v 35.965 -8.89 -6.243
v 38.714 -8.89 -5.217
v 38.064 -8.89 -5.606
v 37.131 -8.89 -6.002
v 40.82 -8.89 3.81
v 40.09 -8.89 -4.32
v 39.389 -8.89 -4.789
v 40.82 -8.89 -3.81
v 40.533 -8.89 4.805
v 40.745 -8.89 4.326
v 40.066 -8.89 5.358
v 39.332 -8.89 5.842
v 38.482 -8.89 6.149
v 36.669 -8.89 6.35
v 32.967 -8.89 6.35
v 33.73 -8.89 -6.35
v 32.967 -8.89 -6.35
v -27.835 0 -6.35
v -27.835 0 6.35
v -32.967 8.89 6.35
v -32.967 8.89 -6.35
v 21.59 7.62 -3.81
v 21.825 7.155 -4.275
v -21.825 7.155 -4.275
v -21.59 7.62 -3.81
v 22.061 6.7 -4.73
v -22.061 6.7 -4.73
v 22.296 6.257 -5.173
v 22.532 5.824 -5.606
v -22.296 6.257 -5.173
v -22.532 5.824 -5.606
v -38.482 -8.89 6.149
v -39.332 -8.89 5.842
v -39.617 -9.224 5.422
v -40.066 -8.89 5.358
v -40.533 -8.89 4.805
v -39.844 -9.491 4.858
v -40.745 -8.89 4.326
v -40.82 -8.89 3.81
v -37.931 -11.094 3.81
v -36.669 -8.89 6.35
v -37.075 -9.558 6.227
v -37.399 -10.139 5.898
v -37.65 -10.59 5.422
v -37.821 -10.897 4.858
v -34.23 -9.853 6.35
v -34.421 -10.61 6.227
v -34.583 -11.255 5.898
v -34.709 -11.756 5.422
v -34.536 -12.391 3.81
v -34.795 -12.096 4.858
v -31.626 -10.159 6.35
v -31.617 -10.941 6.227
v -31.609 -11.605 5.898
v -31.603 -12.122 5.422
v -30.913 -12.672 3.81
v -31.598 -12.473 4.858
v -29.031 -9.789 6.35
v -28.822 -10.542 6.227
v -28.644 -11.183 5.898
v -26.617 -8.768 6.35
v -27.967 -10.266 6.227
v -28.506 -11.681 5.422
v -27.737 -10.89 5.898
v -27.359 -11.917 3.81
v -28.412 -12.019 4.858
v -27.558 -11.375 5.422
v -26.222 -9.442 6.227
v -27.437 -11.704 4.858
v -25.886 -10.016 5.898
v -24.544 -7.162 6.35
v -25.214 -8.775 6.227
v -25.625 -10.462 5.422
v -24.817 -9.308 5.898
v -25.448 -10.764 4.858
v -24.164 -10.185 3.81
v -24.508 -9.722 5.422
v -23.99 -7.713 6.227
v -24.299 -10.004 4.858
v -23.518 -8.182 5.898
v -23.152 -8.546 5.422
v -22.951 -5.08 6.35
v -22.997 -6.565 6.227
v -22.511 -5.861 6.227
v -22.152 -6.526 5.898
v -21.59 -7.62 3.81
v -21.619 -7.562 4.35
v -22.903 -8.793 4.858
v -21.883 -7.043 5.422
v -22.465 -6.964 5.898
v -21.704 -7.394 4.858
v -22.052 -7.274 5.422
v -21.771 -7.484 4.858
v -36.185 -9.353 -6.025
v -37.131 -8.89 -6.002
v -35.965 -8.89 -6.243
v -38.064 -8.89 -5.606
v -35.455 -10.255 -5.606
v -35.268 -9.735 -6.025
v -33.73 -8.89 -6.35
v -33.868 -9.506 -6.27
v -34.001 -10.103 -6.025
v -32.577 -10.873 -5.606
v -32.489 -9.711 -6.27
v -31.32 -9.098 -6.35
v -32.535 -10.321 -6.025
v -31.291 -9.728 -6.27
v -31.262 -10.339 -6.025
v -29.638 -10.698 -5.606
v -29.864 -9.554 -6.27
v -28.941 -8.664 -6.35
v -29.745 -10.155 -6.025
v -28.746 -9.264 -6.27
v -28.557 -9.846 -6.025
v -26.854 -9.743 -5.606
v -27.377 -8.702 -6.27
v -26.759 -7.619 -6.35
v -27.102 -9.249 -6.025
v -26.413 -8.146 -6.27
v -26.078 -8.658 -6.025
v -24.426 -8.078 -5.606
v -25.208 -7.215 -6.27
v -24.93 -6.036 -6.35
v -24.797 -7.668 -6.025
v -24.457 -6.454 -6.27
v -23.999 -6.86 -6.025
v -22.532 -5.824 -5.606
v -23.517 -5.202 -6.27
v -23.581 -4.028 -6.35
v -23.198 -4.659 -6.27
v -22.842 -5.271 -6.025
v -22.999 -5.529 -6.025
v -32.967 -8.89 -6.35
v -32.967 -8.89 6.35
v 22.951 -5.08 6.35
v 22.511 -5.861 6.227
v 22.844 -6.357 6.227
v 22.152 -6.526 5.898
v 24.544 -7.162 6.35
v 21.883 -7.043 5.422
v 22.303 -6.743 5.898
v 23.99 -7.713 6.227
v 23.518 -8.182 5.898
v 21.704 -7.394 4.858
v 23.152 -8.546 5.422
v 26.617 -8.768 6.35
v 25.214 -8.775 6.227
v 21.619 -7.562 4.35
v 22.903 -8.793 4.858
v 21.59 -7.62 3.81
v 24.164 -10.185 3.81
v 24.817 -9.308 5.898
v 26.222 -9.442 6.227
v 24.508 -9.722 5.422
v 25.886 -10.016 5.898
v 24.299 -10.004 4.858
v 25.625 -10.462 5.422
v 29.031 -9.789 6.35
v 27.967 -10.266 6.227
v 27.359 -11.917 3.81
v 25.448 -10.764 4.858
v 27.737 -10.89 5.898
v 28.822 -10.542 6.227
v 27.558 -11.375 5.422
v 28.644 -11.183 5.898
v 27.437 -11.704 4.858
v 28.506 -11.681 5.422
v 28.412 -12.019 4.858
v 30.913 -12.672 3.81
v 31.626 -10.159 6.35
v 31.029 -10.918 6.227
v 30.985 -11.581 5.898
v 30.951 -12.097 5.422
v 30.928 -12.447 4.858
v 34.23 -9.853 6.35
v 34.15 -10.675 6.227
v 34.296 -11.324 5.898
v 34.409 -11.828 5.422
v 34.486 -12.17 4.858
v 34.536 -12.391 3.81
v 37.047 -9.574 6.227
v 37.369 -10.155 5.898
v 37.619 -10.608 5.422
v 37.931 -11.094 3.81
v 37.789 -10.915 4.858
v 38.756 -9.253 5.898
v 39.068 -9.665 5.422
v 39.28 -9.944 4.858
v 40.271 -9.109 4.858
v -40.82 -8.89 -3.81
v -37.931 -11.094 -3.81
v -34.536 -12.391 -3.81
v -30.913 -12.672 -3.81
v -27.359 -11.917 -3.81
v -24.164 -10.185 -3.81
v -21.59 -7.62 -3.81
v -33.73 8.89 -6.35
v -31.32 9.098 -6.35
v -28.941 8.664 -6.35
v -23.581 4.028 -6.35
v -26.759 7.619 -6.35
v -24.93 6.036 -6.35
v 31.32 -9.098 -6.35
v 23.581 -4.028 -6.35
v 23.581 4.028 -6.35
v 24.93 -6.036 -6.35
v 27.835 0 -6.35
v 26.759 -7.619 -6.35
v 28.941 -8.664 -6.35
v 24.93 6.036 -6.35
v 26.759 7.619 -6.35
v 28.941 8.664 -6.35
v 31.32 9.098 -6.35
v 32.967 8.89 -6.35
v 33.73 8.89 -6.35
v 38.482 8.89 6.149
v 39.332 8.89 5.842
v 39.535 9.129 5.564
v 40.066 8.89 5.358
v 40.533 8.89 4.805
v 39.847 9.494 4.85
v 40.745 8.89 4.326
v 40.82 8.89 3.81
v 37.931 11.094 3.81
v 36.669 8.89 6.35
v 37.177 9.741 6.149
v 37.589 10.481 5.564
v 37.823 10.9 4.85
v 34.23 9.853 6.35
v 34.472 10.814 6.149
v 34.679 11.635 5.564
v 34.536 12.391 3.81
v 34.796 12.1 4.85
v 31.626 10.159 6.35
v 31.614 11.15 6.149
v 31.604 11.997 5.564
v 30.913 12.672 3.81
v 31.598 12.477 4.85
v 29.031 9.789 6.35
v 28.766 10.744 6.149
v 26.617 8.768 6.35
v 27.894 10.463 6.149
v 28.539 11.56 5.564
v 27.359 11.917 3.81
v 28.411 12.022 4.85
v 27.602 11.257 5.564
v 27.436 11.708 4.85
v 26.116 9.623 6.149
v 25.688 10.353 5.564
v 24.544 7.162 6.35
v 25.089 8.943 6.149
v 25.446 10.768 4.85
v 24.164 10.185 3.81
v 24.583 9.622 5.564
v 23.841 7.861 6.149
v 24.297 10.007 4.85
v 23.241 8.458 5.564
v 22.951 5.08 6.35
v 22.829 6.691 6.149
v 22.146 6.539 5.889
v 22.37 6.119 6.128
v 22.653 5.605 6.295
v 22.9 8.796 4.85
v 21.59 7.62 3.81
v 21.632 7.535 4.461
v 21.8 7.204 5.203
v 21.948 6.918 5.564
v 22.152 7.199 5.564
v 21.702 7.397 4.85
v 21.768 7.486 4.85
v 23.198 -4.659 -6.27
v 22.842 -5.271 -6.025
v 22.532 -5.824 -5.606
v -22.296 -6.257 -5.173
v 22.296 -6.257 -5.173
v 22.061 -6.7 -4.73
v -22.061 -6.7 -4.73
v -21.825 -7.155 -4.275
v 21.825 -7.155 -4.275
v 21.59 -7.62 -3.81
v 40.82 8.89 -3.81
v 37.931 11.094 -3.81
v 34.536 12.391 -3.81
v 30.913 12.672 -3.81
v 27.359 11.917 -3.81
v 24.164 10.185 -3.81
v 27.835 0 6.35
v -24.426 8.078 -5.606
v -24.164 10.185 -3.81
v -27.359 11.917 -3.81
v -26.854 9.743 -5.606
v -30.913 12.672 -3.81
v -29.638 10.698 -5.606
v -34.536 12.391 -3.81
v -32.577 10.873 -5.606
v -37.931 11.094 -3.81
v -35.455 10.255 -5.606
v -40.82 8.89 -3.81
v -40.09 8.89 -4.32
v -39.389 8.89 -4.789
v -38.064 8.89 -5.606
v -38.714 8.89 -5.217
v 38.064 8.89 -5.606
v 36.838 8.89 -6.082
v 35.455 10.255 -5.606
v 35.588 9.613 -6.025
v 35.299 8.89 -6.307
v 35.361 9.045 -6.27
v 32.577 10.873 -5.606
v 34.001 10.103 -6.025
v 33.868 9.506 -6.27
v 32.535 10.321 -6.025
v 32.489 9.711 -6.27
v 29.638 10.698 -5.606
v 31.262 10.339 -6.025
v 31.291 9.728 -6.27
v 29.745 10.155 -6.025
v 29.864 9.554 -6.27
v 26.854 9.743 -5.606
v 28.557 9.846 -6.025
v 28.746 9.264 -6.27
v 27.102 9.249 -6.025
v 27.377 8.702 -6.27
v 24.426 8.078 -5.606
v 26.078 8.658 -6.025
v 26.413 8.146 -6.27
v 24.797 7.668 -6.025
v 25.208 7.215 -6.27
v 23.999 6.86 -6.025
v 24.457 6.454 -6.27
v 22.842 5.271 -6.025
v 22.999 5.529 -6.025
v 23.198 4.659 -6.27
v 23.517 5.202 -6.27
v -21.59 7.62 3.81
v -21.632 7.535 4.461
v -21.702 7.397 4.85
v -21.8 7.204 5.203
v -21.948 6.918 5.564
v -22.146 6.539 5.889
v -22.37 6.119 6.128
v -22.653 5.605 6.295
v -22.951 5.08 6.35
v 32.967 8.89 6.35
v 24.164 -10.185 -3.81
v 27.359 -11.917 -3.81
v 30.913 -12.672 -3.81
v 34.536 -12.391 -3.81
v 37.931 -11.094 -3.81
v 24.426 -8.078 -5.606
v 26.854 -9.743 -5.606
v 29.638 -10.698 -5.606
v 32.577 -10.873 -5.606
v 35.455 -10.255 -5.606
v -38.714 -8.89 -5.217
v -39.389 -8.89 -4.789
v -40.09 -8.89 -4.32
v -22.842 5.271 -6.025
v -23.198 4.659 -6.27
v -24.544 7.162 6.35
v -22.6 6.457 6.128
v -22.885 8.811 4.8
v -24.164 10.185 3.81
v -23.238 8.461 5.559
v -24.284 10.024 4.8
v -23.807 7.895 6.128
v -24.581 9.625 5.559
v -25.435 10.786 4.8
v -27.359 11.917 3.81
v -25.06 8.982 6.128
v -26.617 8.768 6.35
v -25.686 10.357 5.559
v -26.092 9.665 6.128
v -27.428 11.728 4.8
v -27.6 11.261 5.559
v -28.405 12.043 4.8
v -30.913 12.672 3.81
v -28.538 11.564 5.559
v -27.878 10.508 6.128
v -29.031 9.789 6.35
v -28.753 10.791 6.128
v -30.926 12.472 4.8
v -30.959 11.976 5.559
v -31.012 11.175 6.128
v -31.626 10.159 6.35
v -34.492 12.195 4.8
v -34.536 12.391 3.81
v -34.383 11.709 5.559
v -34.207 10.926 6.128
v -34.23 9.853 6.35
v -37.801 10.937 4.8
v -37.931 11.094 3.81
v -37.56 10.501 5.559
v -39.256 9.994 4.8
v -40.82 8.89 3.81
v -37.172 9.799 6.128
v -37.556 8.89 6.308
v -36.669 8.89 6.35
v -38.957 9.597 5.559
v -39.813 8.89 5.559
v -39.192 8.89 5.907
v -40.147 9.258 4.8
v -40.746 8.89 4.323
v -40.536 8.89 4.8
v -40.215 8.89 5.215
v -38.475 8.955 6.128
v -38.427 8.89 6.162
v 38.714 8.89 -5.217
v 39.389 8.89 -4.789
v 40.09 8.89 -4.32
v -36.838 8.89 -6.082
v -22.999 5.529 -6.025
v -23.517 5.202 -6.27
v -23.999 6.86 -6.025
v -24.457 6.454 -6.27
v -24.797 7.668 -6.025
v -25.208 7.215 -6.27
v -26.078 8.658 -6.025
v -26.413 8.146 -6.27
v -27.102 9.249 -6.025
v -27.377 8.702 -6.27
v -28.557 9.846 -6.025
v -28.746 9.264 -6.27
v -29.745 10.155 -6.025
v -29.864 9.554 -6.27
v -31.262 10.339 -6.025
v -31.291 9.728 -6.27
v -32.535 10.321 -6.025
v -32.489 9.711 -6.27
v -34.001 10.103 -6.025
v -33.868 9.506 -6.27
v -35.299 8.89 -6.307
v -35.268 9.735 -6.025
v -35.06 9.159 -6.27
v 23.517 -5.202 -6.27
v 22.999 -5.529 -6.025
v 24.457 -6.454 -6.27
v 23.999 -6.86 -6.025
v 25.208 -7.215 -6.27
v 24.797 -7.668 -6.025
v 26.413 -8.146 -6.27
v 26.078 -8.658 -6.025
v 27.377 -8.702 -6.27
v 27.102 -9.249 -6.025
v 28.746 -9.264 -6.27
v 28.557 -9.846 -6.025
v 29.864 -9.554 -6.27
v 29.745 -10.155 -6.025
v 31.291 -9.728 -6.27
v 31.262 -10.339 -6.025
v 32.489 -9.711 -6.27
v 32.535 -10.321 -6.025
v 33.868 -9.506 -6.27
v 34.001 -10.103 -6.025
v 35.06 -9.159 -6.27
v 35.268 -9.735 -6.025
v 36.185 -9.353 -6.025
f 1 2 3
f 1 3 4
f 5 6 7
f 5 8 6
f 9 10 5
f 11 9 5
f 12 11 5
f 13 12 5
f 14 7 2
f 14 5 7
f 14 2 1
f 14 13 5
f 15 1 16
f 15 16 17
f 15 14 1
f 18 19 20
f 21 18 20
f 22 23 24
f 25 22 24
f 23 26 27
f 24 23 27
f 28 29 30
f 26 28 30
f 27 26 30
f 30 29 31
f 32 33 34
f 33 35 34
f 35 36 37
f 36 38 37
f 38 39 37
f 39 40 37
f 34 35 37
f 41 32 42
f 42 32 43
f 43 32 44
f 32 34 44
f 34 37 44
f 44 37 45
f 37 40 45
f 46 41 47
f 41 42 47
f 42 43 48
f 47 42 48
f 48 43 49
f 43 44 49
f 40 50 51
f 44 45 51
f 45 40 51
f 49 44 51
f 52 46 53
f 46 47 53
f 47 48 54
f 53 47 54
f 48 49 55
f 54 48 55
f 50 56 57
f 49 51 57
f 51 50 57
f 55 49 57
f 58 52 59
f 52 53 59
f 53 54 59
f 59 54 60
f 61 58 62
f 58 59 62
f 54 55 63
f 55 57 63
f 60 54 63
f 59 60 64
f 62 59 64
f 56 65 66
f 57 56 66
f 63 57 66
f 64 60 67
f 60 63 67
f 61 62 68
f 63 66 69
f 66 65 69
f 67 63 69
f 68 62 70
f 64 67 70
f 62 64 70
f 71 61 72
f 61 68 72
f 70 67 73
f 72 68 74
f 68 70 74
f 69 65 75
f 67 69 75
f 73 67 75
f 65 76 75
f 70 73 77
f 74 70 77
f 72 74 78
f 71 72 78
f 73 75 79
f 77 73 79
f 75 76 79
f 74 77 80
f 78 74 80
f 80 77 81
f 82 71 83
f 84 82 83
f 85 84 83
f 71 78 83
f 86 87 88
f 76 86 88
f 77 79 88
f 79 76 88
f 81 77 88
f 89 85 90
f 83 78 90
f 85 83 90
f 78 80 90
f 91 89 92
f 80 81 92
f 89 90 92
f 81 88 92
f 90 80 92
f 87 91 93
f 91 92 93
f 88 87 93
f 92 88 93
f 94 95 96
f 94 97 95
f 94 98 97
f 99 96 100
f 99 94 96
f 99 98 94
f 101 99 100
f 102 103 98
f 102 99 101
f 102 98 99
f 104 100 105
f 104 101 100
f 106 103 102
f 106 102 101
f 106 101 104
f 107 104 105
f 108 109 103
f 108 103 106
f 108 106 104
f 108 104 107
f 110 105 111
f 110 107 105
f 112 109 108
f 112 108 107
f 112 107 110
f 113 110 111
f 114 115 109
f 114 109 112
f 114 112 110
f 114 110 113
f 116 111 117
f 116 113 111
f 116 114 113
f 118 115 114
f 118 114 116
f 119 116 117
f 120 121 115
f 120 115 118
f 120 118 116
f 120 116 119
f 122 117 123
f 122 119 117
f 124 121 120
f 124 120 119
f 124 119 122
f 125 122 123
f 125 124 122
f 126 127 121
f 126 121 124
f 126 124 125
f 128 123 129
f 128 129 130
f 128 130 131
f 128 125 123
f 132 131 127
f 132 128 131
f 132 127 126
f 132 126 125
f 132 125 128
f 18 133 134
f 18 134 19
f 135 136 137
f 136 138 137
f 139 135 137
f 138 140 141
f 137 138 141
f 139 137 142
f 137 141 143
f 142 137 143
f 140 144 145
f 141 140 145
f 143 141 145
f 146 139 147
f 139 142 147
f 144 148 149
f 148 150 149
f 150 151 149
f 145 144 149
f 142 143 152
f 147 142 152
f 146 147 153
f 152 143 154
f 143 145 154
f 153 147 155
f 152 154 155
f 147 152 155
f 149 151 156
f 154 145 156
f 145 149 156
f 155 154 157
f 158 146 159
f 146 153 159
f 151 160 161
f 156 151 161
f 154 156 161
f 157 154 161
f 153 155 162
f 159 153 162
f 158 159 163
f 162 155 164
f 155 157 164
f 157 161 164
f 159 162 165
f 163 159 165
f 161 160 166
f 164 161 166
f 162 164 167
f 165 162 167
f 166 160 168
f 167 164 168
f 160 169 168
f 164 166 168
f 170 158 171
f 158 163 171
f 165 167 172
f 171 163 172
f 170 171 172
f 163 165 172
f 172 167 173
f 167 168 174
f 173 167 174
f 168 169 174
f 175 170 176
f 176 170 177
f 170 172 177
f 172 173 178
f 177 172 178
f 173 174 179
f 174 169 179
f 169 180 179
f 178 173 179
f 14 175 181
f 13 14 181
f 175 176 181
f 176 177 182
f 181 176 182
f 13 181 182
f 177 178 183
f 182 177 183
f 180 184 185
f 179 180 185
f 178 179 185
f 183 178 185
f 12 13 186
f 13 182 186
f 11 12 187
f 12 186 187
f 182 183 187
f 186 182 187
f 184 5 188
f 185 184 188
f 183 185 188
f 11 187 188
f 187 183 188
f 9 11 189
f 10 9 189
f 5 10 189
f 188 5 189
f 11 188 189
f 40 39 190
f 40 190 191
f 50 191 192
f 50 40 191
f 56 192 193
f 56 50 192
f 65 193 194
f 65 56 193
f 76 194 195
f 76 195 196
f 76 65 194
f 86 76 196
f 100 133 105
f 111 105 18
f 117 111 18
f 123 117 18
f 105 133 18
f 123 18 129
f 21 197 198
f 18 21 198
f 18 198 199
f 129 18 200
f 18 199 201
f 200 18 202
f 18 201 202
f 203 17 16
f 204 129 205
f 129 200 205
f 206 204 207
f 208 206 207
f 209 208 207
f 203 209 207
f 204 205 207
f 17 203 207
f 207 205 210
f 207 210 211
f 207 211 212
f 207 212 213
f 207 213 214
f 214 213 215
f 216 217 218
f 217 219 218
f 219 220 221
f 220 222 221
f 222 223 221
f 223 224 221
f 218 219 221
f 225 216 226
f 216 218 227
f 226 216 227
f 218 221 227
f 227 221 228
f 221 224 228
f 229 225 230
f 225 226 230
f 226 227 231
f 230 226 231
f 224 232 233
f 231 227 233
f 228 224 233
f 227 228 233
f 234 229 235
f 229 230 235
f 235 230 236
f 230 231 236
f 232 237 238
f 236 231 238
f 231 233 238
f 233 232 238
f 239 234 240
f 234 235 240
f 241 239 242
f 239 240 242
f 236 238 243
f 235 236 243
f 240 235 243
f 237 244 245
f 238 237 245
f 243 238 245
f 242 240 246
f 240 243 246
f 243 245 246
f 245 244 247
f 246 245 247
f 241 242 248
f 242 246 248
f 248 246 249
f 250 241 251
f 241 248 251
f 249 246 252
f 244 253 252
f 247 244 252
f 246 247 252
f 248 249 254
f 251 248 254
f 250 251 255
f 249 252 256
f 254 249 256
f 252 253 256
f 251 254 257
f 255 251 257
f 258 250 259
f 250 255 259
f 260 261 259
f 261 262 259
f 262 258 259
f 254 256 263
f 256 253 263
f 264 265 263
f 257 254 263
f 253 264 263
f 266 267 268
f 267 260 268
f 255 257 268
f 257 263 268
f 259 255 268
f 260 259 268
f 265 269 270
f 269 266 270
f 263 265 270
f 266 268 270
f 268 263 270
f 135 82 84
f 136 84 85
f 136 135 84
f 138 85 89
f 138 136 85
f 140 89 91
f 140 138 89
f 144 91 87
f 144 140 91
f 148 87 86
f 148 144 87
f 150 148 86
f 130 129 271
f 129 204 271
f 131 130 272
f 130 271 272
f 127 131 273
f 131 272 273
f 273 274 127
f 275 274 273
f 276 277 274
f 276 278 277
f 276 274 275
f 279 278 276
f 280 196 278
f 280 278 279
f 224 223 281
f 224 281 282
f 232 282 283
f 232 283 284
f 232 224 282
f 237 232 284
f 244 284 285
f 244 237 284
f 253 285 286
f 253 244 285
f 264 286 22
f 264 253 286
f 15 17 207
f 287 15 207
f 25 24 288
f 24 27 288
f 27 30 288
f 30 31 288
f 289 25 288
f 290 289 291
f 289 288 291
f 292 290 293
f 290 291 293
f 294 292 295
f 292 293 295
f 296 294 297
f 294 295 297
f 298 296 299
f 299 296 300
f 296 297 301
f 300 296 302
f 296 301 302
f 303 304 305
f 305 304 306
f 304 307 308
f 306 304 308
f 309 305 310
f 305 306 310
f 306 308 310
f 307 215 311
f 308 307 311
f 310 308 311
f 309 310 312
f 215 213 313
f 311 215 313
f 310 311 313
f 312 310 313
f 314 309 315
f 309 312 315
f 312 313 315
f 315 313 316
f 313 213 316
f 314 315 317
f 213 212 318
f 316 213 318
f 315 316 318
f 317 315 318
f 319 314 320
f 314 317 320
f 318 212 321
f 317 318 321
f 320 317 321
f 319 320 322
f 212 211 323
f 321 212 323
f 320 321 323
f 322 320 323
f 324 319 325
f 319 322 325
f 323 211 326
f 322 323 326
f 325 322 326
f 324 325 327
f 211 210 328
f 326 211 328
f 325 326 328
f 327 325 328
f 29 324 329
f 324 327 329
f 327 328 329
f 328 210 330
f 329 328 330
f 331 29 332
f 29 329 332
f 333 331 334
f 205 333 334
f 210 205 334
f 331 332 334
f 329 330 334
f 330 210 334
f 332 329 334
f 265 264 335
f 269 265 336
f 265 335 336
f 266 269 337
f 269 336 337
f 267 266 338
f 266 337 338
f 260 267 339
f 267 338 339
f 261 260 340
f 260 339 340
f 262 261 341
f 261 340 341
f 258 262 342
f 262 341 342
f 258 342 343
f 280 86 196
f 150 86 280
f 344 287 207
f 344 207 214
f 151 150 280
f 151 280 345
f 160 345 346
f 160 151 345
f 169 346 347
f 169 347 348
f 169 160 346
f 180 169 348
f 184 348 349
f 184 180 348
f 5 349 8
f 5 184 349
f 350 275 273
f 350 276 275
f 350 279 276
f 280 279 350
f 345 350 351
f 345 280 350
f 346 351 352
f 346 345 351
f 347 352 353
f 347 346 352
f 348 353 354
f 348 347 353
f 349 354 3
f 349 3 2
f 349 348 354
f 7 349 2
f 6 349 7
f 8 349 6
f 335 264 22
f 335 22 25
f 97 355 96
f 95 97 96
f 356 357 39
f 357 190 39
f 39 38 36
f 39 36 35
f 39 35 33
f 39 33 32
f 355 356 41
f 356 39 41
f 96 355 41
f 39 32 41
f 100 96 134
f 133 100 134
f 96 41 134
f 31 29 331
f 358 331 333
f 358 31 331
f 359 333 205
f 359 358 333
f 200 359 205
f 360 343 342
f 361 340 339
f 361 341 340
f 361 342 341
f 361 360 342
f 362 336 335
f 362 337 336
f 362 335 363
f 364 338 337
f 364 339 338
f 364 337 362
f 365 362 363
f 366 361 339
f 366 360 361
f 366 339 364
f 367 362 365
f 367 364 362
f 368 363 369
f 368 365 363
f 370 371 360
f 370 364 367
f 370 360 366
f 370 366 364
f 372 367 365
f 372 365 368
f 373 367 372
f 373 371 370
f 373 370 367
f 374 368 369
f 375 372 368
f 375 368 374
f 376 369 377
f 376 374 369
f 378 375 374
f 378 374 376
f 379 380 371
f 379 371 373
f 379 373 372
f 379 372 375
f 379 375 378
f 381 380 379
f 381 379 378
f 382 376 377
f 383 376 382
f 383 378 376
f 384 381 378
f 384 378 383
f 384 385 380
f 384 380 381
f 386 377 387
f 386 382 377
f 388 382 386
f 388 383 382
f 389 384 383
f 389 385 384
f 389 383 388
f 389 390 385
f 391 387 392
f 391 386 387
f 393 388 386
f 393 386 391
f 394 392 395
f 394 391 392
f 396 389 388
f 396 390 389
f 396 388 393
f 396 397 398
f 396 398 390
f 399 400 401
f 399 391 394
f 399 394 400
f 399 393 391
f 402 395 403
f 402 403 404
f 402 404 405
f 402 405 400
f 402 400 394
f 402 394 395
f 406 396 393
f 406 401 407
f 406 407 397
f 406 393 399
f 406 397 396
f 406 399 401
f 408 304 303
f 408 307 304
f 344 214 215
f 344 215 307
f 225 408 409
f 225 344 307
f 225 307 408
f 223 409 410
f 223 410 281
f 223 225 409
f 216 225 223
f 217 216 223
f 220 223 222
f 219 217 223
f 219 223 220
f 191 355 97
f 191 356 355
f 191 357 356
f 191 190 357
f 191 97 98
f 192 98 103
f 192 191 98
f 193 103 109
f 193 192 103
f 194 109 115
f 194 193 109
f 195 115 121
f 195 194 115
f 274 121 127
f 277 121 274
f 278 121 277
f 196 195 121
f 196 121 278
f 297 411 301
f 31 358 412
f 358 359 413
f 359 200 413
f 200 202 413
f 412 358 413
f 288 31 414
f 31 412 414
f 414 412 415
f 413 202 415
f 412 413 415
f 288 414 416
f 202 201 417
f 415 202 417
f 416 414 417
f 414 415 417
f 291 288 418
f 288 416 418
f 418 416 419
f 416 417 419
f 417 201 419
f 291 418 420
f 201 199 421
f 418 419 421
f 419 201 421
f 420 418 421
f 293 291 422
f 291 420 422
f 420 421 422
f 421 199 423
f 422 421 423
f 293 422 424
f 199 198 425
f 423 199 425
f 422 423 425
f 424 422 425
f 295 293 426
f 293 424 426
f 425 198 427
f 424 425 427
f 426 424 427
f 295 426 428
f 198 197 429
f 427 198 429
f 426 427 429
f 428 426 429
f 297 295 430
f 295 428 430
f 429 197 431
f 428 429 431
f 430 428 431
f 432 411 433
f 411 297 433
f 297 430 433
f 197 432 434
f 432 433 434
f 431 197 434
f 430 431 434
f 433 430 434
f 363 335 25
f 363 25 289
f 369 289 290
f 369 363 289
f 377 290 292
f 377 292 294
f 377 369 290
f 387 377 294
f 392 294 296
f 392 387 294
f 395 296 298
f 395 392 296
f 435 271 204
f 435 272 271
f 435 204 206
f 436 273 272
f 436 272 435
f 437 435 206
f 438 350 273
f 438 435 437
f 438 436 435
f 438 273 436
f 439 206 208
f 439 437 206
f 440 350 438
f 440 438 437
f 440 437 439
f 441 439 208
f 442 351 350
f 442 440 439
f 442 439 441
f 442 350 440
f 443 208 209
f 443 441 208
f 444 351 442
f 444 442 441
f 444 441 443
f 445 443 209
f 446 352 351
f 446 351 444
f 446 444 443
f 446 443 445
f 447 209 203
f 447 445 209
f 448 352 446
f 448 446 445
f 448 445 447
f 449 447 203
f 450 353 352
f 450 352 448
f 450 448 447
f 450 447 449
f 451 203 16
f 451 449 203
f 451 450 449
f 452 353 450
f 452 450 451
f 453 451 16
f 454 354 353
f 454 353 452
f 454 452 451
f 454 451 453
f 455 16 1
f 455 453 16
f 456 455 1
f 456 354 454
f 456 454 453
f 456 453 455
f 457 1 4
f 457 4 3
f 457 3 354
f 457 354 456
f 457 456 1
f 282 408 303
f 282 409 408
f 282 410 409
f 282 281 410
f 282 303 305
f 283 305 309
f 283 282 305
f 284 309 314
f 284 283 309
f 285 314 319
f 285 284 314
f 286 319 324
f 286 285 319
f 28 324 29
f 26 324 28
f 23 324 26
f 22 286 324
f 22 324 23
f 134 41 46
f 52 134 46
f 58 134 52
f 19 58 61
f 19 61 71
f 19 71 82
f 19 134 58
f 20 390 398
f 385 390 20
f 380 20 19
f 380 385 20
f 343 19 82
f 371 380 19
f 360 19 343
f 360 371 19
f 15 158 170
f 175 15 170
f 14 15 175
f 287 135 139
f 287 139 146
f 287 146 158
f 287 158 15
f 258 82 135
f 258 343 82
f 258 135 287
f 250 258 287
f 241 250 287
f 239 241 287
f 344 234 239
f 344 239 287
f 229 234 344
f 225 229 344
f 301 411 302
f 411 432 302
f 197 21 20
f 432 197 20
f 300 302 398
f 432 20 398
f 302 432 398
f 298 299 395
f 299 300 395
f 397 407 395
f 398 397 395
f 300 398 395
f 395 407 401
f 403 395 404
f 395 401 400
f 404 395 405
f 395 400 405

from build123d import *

# Parameters (mm, degrees)
F1_DEPTH = 6.35
F3_DEPTH = 12.701
F6_R     = 2.54
F7_SIZE  = 2.54
F8_R     = 2.54


with BuildPart() as f1:
    # F0 (on Top) → F1 (new body, symmetric)
    with BuildSketch(Plane.XY):
        with BuildLine():
            Line((21.59, 7.62), (-21.59, 7.62))
            ThreePointArc((-21.59, 7.62), (-44.45, 0), (-21.59, -7.62))
            Line((-21.59, -7.62), (21.59, -7.62))
            ThreePointArc((21.59, -7.62), (44.45, 0), (21.59, 7.62))
        make_face()
    extrude(amount=F1_DEPTH, both=True)

    # F4: F3 across plane


with BuildPart() as f3:
    # F2 (on face) → F3 (new body, through all)
    with BuildSketch(Plane.XY.offset(6.35)):
        Polygon((-27.8347122138, 0), (-32.9673561069, 8.89), (-43.2326438931, 8.89), (-48.3652877862, 0), (-43.2326438931, -8.89), (-32.9673561069, -8.89), align=None)
    extrude(amount=-F3_DEPTH)


with BuildPart() as f1_1:
    add(f1.part)
    add(f3.part.mirror(Plane.YZ), mode=Mode.SUBTRACT)

    # F5: cut F3
    add(f3.part, mode=Mode.SUBTRACT)

    # F6
    f6_edges = [f1_1.edges().sort_by_distance(p)[0] for p in [
        (0, -7.62, 6.35),
        (-30.913065, -12.672393, 6.35),
        (-30.913065, 12.672393, 6.35),
        (0, 7.62, 6.35),
        (30.913065, 12.672393, 6.35),
        (30.913065, -12.672393, 6.35),
    ]]
    fillet(f6_edges, radius=F6_R)

    # F7
    f7_edges = [f1_1.edges().sort_by_distance(p)[0] for p in [
        (-30.913065, -12.672393, -6.35),
        (0, -7.62, -6.35),
        (30.913065, -12.672393, -6.35),
        (30.913065, 12.672393, -6.35),
        (0, 7.62, -6.35),
        (-30.913065, 12.672393, -6.35),
    ]]
    chamfer(f7_edges, length=F7_SIZE)

    # F8
    f8_edges = [f1_1.edges().sort_by_distance(p)[0] for p in [
        (-29.031016, -9.789419, -6.35),
        (0, -5.08, -6.35),
        (29.031016, -9.789419, -6.35),
        (29.031016, 9.789419, -6.35),
        (0, 5.08, -6.35),
        (-29.031016, 9.789419, -6.35),
    ]]
    fillet(f8_edges, radius=F8_R)


solid = f1_1.part
